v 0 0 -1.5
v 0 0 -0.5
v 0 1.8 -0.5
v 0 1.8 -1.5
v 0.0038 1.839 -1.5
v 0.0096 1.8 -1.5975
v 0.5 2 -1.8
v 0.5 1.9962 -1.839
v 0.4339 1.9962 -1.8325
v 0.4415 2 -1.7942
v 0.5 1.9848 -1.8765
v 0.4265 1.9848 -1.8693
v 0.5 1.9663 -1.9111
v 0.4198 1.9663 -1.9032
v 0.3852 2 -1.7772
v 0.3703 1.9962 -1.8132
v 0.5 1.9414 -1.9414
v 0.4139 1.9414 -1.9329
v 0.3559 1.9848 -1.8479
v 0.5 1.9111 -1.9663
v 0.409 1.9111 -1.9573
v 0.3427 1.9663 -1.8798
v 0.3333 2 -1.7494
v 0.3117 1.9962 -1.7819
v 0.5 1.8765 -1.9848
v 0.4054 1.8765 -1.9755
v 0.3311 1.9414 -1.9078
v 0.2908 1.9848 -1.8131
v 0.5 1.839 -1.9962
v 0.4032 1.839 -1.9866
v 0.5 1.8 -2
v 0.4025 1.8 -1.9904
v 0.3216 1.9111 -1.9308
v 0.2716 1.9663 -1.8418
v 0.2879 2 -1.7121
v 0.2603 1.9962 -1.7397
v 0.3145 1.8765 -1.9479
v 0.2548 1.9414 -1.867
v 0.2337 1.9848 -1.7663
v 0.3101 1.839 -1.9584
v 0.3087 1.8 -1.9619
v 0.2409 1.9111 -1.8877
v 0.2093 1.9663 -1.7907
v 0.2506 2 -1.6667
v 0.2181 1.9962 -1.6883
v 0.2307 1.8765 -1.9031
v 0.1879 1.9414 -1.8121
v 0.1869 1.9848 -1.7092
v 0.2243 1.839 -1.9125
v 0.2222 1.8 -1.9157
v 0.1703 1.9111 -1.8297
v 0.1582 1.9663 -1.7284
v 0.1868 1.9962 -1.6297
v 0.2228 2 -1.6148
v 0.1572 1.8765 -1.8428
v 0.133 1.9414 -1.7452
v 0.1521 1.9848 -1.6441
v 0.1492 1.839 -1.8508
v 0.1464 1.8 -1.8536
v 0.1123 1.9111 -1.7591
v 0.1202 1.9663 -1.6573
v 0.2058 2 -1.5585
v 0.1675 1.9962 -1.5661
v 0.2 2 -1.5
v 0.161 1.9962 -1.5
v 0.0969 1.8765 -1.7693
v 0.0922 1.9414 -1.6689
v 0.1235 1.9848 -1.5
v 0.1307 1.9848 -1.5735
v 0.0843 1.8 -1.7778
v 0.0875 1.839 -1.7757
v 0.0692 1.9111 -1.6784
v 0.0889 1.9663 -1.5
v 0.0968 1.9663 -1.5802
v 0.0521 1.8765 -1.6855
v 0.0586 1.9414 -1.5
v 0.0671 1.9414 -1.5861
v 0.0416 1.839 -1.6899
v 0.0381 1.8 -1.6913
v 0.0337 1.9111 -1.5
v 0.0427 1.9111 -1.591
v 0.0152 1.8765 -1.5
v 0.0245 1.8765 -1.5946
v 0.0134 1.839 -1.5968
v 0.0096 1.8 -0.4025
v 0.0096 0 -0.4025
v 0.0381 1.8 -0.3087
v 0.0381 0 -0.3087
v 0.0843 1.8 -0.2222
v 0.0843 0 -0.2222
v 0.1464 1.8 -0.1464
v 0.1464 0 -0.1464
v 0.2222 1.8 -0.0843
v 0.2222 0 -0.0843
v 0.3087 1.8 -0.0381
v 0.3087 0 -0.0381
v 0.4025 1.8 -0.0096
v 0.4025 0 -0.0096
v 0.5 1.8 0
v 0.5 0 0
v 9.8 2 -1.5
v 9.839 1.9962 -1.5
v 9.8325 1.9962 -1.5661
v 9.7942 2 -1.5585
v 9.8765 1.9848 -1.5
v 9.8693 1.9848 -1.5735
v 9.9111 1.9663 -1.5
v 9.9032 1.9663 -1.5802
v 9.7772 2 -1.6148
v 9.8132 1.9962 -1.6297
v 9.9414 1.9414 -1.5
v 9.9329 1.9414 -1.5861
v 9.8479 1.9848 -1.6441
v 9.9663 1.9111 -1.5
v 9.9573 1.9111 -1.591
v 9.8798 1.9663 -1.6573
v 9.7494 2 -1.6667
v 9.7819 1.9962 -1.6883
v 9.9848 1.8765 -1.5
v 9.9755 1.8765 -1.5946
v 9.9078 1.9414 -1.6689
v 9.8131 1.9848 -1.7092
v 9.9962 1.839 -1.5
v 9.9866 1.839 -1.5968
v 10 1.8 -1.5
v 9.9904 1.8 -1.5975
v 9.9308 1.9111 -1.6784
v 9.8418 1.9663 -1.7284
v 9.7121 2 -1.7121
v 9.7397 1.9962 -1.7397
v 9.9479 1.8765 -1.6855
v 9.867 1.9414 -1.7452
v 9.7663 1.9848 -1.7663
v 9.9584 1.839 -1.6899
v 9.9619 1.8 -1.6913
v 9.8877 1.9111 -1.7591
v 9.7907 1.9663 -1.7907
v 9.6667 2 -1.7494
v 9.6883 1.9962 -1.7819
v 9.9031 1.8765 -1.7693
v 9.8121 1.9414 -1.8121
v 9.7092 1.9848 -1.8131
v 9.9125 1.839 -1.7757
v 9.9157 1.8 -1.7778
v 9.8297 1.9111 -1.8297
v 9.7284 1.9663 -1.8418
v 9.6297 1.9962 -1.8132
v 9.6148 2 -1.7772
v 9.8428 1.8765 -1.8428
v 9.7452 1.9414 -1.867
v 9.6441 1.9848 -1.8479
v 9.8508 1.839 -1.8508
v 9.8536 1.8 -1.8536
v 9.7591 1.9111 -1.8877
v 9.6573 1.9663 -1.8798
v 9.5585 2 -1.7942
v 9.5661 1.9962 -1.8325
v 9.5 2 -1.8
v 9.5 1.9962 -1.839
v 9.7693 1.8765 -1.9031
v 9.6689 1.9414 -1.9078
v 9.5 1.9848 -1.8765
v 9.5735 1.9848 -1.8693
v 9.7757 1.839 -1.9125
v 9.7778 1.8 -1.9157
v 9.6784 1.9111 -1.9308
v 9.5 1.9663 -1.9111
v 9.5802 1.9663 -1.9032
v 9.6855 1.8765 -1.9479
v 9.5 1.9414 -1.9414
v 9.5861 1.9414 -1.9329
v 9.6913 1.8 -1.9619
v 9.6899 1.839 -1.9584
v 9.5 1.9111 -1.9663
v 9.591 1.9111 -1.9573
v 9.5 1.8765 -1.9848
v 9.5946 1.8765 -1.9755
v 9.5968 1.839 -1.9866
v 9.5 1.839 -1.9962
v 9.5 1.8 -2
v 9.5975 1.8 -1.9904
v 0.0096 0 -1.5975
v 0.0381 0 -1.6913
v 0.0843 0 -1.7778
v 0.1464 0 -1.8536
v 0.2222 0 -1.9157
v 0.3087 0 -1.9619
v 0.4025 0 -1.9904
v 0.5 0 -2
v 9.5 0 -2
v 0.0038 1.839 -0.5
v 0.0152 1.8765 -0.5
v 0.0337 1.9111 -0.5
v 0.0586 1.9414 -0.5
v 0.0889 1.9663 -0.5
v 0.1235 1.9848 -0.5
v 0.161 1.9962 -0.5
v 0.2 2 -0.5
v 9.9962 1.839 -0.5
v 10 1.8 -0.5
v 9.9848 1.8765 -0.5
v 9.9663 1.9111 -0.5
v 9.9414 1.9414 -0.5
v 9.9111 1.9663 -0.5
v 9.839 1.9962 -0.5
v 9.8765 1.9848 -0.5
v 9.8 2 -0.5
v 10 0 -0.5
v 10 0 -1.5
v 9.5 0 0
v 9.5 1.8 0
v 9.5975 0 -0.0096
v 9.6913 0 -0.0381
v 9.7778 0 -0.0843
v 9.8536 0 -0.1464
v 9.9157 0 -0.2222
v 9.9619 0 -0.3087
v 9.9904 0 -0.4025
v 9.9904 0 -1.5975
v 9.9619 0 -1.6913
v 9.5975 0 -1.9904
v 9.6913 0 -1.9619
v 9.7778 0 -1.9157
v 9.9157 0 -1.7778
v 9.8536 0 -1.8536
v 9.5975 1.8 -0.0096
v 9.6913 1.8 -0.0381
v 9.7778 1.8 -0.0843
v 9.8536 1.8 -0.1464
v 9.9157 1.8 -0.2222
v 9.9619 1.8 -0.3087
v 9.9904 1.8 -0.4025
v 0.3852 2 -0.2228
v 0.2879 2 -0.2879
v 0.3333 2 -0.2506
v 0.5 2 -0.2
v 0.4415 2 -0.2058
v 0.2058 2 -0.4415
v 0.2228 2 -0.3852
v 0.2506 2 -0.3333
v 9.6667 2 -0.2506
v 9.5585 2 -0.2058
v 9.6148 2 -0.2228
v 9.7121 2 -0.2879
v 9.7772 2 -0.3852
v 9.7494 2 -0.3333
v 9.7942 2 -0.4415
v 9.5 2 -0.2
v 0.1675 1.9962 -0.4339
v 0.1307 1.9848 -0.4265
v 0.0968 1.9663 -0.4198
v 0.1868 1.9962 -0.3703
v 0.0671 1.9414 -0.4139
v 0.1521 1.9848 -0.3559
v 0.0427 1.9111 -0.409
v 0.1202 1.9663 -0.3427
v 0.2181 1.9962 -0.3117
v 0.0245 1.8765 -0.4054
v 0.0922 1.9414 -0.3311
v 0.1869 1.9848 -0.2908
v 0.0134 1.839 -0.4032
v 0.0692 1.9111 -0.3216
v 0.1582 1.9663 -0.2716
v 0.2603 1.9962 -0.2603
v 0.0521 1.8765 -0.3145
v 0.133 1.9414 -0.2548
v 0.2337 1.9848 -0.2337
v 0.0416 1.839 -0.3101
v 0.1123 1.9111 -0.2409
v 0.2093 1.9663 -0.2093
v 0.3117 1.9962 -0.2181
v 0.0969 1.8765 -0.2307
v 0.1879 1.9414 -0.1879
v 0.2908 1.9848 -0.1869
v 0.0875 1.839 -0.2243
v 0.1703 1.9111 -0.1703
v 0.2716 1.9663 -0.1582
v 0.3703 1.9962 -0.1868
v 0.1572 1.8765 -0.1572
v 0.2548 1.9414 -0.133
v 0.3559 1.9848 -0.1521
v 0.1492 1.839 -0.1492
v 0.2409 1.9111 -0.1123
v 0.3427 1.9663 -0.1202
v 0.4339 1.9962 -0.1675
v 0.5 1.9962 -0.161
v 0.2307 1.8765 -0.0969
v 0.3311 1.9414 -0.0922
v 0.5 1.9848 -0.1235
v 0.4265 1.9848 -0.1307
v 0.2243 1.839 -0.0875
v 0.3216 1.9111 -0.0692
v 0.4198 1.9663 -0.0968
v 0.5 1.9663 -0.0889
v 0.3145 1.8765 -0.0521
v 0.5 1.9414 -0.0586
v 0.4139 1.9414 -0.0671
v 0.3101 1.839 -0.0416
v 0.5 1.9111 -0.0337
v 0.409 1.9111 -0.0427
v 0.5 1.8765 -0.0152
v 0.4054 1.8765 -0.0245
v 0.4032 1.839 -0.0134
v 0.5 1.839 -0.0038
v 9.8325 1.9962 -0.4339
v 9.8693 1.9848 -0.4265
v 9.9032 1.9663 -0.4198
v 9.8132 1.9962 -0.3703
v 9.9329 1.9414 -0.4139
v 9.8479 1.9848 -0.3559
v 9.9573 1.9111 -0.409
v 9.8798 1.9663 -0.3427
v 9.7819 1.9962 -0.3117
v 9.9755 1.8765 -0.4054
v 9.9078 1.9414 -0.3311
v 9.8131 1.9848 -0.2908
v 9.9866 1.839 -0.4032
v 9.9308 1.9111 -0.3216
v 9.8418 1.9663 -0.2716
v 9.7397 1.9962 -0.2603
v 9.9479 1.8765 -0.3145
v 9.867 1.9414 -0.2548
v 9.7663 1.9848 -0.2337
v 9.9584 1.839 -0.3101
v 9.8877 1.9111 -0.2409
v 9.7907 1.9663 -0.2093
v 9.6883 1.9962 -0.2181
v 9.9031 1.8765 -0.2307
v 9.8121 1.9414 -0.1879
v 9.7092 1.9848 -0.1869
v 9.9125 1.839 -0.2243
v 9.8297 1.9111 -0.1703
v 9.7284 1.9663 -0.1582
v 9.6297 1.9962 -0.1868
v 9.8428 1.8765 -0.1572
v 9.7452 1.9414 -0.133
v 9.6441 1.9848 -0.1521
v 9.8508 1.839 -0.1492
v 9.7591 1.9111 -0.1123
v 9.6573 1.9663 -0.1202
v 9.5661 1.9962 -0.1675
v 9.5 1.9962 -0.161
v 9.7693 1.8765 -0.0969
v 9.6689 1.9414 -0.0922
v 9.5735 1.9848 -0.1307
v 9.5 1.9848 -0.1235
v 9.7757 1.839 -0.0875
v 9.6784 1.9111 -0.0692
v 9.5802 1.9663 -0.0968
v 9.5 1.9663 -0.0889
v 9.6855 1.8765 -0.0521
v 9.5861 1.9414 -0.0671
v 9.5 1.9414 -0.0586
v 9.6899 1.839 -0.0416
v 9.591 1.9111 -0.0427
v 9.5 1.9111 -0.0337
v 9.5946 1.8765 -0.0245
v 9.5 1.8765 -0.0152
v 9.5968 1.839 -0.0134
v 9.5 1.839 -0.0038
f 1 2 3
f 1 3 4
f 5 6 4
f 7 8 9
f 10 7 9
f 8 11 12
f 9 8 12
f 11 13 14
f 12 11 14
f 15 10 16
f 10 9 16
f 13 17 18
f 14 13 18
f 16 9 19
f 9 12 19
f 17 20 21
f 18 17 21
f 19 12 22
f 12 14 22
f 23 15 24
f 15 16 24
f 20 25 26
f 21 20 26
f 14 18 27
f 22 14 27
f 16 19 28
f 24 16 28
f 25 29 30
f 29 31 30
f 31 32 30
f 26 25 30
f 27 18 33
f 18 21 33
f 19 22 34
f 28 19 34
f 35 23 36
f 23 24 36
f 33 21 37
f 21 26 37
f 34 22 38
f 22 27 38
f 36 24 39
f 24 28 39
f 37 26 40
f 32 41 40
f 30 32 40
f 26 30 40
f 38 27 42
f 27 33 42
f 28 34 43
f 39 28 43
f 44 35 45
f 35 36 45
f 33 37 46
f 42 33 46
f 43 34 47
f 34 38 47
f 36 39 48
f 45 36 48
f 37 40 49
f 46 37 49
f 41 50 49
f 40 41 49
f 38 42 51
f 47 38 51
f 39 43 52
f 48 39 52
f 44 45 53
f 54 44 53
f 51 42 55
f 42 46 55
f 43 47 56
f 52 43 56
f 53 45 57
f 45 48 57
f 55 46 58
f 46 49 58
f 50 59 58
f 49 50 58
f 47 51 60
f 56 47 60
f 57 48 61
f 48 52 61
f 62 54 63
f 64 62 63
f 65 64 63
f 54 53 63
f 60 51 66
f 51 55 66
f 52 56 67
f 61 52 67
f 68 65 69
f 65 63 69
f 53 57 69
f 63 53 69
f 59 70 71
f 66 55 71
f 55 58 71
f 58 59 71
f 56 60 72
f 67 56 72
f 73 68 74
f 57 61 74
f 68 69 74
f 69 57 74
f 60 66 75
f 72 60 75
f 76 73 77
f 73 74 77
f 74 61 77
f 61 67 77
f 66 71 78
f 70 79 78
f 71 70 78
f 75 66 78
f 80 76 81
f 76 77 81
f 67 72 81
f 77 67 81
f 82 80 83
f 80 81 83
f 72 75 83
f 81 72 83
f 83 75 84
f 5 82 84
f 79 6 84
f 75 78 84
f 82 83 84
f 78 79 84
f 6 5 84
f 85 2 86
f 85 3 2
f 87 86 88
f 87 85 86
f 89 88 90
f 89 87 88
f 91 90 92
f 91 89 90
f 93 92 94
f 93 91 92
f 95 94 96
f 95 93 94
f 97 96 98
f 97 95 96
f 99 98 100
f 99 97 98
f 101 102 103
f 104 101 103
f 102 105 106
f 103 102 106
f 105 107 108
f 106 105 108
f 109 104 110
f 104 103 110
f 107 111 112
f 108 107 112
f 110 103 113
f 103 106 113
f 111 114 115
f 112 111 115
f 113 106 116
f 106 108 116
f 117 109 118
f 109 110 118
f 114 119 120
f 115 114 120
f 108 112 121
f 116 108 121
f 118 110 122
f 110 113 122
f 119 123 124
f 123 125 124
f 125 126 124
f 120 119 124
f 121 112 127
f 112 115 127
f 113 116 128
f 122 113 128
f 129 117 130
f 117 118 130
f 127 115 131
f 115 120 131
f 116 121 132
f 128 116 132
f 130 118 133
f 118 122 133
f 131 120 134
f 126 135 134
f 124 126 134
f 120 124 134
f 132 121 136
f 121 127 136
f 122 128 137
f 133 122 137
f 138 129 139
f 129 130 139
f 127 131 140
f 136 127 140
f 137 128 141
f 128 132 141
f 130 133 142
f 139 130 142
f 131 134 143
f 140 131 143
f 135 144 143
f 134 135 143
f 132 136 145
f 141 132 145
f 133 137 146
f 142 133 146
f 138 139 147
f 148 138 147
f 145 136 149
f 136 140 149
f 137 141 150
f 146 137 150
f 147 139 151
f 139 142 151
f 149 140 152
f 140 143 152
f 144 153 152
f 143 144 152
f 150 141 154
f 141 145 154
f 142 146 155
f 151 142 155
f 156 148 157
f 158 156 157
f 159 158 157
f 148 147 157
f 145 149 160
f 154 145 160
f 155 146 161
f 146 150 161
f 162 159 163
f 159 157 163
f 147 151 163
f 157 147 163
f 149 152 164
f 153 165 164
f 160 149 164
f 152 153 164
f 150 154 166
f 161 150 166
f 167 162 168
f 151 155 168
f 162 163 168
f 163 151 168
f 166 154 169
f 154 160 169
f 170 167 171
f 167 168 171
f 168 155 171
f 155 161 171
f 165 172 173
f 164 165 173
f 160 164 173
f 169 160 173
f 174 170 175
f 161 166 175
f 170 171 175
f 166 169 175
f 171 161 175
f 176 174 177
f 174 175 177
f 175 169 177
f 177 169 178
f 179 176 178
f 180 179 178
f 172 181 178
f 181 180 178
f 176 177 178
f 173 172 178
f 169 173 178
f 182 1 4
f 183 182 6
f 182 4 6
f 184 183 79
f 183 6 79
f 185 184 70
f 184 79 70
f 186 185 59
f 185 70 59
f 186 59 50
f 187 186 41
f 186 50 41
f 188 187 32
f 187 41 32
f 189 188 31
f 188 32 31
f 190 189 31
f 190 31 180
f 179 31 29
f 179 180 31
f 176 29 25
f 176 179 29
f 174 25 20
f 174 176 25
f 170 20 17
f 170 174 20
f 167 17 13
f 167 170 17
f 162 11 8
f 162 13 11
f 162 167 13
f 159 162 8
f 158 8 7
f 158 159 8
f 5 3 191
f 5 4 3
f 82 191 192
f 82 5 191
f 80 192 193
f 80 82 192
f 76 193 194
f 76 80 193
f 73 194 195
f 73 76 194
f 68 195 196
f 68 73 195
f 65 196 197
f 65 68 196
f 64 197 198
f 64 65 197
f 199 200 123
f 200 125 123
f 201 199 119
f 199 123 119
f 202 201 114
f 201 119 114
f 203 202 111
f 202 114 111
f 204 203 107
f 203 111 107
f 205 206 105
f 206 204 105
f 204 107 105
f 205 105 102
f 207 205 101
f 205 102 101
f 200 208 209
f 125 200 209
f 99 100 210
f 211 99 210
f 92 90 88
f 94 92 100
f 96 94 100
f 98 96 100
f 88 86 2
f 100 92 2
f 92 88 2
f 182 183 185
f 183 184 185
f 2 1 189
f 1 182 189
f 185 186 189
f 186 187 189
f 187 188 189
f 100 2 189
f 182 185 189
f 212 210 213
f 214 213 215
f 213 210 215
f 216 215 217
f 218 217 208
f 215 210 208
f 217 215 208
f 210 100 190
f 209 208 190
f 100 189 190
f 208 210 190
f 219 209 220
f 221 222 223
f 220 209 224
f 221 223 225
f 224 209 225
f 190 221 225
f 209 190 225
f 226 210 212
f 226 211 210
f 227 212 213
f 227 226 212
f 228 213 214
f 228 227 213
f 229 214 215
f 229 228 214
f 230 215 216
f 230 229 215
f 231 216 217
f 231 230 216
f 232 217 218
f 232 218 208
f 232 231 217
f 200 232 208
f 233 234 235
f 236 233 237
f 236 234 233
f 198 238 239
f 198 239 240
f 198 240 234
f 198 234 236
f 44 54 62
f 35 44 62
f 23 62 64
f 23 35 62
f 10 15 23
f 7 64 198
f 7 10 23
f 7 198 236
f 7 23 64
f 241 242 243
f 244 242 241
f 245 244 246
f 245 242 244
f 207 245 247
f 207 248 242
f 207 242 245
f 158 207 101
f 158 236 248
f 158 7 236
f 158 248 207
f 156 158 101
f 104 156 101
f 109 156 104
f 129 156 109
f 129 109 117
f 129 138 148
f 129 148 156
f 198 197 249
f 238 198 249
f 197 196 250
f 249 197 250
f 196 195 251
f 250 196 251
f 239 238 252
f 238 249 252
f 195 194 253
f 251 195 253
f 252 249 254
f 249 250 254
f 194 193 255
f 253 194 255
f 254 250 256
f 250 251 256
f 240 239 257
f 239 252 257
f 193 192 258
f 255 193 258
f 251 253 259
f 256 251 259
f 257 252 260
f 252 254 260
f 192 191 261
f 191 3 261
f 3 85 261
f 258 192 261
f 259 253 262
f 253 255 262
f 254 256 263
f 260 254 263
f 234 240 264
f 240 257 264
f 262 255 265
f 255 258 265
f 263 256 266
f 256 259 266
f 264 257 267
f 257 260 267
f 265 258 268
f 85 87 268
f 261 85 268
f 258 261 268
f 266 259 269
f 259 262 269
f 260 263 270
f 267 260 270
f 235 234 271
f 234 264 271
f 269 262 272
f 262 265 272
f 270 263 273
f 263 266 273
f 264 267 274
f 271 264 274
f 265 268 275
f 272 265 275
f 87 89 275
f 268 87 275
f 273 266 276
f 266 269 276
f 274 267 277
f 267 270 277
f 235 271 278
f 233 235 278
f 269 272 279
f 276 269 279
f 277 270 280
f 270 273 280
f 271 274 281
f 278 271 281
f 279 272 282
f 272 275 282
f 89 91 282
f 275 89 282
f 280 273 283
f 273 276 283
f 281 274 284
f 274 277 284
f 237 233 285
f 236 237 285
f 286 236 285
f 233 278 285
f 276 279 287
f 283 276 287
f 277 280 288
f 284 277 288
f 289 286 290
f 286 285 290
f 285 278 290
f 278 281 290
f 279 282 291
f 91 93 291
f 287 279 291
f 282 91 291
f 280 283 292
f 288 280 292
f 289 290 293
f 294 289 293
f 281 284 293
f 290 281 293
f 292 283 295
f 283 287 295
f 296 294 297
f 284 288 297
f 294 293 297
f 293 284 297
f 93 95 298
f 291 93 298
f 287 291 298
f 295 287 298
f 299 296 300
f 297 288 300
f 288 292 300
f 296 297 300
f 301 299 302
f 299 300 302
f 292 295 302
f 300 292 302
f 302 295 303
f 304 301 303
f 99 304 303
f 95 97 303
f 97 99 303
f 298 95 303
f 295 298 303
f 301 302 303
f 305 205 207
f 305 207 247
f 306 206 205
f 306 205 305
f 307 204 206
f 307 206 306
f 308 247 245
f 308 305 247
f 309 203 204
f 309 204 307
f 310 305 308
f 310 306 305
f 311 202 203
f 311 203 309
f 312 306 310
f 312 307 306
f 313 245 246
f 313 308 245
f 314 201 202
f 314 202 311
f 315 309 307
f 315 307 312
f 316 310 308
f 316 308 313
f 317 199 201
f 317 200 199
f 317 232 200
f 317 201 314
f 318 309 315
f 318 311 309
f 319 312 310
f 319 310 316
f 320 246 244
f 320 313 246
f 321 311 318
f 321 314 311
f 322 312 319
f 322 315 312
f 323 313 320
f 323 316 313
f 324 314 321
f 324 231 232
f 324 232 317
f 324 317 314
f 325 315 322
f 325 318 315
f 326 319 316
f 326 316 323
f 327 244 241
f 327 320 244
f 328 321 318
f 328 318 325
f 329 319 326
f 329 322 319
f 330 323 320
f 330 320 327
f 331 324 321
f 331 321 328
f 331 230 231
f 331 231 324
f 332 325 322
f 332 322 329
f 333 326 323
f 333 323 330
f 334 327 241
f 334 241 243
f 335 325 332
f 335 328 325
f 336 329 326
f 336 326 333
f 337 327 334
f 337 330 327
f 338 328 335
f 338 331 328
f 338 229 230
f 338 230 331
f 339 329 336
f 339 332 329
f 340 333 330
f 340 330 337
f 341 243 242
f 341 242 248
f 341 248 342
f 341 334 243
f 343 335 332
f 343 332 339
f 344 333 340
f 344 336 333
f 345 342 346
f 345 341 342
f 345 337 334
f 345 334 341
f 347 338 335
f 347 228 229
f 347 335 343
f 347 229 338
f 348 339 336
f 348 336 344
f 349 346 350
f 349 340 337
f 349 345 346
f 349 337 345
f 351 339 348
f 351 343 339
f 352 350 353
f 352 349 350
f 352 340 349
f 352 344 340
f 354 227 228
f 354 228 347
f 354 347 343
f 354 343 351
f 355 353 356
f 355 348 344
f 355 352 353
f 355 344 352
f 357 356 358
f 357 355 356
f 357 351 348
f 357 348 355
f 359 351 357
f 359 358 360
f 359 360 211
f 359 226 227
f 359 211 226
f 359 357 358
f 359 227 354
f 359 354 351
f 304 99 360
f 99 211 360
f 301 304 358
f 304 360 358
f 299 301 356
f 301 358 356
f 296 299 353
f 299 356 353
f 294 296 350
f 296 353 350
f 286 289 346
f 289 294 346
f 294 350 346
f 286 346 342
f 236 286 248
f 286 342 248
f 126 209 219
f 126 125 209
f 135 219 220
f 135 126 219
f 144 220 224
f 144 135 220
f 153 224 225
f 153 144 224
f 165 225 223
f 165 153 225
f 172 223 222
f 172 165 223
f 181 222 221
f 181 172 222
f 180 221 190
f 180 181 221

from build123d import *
from OCP.BRepFilletAPI import BRepFilletAPI_MakeFillet

# Parameters (mm, degrees)
SKETCH1_W           = 10
SKETCH1_H           = 2
BOSS_EXTRUDE1_DEPTH = 2
FILLET1_R1          = 0.2
FILLET1_R2          = 0.5


with BuildPart() as part:
    # Sketch1 → Boss-Extrude1 (new body)
    with BuildSketch(Plane(origin=(0, 0, 0), x_dir=(1, 0, 0), z_dir=(0, 1, 0))):
        with Locations((5, 1)):
            Rectangle(SKETCH1_W, SKETCH1_H)
    extrude(amount=BOSS_EXTRUDE1_DEPTH)

    # Fillet1: one fillet with a radius per group of edges: ONE call of the kernel's fillet builder (fillet() takes one radius for all edges)
    fillet1_edges_1 = [part.edges().sort_by_distance(p)[0] for p in [
        (10, 2, -1),
        (5, 2, -2),
        (0, 2, -1),
        (5, 2, 0),
    ]]
    fillet1_edges_2 = [part.edges().sort_by_distance(p)[0] for p in [
        (0, 1, -2),
        (10, 1, -2),
        (10, 1, 0),
        (0, 1, 0),
    ]]
    fillet1 = BRepFilletAPI_MakeFillet(part.part.solid().wrapped)
    for e in fillet1_edges_1:
        fillet1.Add(FILLET1_R1, e.wrapped)
    for e in fillet1_edges_2:
        fillet1.Add(FILLET1_R2, e.wrapped)
    add(Compound.cast(fillet1.Shape()), mode=Mode.REPLACE)


solid = part.part
